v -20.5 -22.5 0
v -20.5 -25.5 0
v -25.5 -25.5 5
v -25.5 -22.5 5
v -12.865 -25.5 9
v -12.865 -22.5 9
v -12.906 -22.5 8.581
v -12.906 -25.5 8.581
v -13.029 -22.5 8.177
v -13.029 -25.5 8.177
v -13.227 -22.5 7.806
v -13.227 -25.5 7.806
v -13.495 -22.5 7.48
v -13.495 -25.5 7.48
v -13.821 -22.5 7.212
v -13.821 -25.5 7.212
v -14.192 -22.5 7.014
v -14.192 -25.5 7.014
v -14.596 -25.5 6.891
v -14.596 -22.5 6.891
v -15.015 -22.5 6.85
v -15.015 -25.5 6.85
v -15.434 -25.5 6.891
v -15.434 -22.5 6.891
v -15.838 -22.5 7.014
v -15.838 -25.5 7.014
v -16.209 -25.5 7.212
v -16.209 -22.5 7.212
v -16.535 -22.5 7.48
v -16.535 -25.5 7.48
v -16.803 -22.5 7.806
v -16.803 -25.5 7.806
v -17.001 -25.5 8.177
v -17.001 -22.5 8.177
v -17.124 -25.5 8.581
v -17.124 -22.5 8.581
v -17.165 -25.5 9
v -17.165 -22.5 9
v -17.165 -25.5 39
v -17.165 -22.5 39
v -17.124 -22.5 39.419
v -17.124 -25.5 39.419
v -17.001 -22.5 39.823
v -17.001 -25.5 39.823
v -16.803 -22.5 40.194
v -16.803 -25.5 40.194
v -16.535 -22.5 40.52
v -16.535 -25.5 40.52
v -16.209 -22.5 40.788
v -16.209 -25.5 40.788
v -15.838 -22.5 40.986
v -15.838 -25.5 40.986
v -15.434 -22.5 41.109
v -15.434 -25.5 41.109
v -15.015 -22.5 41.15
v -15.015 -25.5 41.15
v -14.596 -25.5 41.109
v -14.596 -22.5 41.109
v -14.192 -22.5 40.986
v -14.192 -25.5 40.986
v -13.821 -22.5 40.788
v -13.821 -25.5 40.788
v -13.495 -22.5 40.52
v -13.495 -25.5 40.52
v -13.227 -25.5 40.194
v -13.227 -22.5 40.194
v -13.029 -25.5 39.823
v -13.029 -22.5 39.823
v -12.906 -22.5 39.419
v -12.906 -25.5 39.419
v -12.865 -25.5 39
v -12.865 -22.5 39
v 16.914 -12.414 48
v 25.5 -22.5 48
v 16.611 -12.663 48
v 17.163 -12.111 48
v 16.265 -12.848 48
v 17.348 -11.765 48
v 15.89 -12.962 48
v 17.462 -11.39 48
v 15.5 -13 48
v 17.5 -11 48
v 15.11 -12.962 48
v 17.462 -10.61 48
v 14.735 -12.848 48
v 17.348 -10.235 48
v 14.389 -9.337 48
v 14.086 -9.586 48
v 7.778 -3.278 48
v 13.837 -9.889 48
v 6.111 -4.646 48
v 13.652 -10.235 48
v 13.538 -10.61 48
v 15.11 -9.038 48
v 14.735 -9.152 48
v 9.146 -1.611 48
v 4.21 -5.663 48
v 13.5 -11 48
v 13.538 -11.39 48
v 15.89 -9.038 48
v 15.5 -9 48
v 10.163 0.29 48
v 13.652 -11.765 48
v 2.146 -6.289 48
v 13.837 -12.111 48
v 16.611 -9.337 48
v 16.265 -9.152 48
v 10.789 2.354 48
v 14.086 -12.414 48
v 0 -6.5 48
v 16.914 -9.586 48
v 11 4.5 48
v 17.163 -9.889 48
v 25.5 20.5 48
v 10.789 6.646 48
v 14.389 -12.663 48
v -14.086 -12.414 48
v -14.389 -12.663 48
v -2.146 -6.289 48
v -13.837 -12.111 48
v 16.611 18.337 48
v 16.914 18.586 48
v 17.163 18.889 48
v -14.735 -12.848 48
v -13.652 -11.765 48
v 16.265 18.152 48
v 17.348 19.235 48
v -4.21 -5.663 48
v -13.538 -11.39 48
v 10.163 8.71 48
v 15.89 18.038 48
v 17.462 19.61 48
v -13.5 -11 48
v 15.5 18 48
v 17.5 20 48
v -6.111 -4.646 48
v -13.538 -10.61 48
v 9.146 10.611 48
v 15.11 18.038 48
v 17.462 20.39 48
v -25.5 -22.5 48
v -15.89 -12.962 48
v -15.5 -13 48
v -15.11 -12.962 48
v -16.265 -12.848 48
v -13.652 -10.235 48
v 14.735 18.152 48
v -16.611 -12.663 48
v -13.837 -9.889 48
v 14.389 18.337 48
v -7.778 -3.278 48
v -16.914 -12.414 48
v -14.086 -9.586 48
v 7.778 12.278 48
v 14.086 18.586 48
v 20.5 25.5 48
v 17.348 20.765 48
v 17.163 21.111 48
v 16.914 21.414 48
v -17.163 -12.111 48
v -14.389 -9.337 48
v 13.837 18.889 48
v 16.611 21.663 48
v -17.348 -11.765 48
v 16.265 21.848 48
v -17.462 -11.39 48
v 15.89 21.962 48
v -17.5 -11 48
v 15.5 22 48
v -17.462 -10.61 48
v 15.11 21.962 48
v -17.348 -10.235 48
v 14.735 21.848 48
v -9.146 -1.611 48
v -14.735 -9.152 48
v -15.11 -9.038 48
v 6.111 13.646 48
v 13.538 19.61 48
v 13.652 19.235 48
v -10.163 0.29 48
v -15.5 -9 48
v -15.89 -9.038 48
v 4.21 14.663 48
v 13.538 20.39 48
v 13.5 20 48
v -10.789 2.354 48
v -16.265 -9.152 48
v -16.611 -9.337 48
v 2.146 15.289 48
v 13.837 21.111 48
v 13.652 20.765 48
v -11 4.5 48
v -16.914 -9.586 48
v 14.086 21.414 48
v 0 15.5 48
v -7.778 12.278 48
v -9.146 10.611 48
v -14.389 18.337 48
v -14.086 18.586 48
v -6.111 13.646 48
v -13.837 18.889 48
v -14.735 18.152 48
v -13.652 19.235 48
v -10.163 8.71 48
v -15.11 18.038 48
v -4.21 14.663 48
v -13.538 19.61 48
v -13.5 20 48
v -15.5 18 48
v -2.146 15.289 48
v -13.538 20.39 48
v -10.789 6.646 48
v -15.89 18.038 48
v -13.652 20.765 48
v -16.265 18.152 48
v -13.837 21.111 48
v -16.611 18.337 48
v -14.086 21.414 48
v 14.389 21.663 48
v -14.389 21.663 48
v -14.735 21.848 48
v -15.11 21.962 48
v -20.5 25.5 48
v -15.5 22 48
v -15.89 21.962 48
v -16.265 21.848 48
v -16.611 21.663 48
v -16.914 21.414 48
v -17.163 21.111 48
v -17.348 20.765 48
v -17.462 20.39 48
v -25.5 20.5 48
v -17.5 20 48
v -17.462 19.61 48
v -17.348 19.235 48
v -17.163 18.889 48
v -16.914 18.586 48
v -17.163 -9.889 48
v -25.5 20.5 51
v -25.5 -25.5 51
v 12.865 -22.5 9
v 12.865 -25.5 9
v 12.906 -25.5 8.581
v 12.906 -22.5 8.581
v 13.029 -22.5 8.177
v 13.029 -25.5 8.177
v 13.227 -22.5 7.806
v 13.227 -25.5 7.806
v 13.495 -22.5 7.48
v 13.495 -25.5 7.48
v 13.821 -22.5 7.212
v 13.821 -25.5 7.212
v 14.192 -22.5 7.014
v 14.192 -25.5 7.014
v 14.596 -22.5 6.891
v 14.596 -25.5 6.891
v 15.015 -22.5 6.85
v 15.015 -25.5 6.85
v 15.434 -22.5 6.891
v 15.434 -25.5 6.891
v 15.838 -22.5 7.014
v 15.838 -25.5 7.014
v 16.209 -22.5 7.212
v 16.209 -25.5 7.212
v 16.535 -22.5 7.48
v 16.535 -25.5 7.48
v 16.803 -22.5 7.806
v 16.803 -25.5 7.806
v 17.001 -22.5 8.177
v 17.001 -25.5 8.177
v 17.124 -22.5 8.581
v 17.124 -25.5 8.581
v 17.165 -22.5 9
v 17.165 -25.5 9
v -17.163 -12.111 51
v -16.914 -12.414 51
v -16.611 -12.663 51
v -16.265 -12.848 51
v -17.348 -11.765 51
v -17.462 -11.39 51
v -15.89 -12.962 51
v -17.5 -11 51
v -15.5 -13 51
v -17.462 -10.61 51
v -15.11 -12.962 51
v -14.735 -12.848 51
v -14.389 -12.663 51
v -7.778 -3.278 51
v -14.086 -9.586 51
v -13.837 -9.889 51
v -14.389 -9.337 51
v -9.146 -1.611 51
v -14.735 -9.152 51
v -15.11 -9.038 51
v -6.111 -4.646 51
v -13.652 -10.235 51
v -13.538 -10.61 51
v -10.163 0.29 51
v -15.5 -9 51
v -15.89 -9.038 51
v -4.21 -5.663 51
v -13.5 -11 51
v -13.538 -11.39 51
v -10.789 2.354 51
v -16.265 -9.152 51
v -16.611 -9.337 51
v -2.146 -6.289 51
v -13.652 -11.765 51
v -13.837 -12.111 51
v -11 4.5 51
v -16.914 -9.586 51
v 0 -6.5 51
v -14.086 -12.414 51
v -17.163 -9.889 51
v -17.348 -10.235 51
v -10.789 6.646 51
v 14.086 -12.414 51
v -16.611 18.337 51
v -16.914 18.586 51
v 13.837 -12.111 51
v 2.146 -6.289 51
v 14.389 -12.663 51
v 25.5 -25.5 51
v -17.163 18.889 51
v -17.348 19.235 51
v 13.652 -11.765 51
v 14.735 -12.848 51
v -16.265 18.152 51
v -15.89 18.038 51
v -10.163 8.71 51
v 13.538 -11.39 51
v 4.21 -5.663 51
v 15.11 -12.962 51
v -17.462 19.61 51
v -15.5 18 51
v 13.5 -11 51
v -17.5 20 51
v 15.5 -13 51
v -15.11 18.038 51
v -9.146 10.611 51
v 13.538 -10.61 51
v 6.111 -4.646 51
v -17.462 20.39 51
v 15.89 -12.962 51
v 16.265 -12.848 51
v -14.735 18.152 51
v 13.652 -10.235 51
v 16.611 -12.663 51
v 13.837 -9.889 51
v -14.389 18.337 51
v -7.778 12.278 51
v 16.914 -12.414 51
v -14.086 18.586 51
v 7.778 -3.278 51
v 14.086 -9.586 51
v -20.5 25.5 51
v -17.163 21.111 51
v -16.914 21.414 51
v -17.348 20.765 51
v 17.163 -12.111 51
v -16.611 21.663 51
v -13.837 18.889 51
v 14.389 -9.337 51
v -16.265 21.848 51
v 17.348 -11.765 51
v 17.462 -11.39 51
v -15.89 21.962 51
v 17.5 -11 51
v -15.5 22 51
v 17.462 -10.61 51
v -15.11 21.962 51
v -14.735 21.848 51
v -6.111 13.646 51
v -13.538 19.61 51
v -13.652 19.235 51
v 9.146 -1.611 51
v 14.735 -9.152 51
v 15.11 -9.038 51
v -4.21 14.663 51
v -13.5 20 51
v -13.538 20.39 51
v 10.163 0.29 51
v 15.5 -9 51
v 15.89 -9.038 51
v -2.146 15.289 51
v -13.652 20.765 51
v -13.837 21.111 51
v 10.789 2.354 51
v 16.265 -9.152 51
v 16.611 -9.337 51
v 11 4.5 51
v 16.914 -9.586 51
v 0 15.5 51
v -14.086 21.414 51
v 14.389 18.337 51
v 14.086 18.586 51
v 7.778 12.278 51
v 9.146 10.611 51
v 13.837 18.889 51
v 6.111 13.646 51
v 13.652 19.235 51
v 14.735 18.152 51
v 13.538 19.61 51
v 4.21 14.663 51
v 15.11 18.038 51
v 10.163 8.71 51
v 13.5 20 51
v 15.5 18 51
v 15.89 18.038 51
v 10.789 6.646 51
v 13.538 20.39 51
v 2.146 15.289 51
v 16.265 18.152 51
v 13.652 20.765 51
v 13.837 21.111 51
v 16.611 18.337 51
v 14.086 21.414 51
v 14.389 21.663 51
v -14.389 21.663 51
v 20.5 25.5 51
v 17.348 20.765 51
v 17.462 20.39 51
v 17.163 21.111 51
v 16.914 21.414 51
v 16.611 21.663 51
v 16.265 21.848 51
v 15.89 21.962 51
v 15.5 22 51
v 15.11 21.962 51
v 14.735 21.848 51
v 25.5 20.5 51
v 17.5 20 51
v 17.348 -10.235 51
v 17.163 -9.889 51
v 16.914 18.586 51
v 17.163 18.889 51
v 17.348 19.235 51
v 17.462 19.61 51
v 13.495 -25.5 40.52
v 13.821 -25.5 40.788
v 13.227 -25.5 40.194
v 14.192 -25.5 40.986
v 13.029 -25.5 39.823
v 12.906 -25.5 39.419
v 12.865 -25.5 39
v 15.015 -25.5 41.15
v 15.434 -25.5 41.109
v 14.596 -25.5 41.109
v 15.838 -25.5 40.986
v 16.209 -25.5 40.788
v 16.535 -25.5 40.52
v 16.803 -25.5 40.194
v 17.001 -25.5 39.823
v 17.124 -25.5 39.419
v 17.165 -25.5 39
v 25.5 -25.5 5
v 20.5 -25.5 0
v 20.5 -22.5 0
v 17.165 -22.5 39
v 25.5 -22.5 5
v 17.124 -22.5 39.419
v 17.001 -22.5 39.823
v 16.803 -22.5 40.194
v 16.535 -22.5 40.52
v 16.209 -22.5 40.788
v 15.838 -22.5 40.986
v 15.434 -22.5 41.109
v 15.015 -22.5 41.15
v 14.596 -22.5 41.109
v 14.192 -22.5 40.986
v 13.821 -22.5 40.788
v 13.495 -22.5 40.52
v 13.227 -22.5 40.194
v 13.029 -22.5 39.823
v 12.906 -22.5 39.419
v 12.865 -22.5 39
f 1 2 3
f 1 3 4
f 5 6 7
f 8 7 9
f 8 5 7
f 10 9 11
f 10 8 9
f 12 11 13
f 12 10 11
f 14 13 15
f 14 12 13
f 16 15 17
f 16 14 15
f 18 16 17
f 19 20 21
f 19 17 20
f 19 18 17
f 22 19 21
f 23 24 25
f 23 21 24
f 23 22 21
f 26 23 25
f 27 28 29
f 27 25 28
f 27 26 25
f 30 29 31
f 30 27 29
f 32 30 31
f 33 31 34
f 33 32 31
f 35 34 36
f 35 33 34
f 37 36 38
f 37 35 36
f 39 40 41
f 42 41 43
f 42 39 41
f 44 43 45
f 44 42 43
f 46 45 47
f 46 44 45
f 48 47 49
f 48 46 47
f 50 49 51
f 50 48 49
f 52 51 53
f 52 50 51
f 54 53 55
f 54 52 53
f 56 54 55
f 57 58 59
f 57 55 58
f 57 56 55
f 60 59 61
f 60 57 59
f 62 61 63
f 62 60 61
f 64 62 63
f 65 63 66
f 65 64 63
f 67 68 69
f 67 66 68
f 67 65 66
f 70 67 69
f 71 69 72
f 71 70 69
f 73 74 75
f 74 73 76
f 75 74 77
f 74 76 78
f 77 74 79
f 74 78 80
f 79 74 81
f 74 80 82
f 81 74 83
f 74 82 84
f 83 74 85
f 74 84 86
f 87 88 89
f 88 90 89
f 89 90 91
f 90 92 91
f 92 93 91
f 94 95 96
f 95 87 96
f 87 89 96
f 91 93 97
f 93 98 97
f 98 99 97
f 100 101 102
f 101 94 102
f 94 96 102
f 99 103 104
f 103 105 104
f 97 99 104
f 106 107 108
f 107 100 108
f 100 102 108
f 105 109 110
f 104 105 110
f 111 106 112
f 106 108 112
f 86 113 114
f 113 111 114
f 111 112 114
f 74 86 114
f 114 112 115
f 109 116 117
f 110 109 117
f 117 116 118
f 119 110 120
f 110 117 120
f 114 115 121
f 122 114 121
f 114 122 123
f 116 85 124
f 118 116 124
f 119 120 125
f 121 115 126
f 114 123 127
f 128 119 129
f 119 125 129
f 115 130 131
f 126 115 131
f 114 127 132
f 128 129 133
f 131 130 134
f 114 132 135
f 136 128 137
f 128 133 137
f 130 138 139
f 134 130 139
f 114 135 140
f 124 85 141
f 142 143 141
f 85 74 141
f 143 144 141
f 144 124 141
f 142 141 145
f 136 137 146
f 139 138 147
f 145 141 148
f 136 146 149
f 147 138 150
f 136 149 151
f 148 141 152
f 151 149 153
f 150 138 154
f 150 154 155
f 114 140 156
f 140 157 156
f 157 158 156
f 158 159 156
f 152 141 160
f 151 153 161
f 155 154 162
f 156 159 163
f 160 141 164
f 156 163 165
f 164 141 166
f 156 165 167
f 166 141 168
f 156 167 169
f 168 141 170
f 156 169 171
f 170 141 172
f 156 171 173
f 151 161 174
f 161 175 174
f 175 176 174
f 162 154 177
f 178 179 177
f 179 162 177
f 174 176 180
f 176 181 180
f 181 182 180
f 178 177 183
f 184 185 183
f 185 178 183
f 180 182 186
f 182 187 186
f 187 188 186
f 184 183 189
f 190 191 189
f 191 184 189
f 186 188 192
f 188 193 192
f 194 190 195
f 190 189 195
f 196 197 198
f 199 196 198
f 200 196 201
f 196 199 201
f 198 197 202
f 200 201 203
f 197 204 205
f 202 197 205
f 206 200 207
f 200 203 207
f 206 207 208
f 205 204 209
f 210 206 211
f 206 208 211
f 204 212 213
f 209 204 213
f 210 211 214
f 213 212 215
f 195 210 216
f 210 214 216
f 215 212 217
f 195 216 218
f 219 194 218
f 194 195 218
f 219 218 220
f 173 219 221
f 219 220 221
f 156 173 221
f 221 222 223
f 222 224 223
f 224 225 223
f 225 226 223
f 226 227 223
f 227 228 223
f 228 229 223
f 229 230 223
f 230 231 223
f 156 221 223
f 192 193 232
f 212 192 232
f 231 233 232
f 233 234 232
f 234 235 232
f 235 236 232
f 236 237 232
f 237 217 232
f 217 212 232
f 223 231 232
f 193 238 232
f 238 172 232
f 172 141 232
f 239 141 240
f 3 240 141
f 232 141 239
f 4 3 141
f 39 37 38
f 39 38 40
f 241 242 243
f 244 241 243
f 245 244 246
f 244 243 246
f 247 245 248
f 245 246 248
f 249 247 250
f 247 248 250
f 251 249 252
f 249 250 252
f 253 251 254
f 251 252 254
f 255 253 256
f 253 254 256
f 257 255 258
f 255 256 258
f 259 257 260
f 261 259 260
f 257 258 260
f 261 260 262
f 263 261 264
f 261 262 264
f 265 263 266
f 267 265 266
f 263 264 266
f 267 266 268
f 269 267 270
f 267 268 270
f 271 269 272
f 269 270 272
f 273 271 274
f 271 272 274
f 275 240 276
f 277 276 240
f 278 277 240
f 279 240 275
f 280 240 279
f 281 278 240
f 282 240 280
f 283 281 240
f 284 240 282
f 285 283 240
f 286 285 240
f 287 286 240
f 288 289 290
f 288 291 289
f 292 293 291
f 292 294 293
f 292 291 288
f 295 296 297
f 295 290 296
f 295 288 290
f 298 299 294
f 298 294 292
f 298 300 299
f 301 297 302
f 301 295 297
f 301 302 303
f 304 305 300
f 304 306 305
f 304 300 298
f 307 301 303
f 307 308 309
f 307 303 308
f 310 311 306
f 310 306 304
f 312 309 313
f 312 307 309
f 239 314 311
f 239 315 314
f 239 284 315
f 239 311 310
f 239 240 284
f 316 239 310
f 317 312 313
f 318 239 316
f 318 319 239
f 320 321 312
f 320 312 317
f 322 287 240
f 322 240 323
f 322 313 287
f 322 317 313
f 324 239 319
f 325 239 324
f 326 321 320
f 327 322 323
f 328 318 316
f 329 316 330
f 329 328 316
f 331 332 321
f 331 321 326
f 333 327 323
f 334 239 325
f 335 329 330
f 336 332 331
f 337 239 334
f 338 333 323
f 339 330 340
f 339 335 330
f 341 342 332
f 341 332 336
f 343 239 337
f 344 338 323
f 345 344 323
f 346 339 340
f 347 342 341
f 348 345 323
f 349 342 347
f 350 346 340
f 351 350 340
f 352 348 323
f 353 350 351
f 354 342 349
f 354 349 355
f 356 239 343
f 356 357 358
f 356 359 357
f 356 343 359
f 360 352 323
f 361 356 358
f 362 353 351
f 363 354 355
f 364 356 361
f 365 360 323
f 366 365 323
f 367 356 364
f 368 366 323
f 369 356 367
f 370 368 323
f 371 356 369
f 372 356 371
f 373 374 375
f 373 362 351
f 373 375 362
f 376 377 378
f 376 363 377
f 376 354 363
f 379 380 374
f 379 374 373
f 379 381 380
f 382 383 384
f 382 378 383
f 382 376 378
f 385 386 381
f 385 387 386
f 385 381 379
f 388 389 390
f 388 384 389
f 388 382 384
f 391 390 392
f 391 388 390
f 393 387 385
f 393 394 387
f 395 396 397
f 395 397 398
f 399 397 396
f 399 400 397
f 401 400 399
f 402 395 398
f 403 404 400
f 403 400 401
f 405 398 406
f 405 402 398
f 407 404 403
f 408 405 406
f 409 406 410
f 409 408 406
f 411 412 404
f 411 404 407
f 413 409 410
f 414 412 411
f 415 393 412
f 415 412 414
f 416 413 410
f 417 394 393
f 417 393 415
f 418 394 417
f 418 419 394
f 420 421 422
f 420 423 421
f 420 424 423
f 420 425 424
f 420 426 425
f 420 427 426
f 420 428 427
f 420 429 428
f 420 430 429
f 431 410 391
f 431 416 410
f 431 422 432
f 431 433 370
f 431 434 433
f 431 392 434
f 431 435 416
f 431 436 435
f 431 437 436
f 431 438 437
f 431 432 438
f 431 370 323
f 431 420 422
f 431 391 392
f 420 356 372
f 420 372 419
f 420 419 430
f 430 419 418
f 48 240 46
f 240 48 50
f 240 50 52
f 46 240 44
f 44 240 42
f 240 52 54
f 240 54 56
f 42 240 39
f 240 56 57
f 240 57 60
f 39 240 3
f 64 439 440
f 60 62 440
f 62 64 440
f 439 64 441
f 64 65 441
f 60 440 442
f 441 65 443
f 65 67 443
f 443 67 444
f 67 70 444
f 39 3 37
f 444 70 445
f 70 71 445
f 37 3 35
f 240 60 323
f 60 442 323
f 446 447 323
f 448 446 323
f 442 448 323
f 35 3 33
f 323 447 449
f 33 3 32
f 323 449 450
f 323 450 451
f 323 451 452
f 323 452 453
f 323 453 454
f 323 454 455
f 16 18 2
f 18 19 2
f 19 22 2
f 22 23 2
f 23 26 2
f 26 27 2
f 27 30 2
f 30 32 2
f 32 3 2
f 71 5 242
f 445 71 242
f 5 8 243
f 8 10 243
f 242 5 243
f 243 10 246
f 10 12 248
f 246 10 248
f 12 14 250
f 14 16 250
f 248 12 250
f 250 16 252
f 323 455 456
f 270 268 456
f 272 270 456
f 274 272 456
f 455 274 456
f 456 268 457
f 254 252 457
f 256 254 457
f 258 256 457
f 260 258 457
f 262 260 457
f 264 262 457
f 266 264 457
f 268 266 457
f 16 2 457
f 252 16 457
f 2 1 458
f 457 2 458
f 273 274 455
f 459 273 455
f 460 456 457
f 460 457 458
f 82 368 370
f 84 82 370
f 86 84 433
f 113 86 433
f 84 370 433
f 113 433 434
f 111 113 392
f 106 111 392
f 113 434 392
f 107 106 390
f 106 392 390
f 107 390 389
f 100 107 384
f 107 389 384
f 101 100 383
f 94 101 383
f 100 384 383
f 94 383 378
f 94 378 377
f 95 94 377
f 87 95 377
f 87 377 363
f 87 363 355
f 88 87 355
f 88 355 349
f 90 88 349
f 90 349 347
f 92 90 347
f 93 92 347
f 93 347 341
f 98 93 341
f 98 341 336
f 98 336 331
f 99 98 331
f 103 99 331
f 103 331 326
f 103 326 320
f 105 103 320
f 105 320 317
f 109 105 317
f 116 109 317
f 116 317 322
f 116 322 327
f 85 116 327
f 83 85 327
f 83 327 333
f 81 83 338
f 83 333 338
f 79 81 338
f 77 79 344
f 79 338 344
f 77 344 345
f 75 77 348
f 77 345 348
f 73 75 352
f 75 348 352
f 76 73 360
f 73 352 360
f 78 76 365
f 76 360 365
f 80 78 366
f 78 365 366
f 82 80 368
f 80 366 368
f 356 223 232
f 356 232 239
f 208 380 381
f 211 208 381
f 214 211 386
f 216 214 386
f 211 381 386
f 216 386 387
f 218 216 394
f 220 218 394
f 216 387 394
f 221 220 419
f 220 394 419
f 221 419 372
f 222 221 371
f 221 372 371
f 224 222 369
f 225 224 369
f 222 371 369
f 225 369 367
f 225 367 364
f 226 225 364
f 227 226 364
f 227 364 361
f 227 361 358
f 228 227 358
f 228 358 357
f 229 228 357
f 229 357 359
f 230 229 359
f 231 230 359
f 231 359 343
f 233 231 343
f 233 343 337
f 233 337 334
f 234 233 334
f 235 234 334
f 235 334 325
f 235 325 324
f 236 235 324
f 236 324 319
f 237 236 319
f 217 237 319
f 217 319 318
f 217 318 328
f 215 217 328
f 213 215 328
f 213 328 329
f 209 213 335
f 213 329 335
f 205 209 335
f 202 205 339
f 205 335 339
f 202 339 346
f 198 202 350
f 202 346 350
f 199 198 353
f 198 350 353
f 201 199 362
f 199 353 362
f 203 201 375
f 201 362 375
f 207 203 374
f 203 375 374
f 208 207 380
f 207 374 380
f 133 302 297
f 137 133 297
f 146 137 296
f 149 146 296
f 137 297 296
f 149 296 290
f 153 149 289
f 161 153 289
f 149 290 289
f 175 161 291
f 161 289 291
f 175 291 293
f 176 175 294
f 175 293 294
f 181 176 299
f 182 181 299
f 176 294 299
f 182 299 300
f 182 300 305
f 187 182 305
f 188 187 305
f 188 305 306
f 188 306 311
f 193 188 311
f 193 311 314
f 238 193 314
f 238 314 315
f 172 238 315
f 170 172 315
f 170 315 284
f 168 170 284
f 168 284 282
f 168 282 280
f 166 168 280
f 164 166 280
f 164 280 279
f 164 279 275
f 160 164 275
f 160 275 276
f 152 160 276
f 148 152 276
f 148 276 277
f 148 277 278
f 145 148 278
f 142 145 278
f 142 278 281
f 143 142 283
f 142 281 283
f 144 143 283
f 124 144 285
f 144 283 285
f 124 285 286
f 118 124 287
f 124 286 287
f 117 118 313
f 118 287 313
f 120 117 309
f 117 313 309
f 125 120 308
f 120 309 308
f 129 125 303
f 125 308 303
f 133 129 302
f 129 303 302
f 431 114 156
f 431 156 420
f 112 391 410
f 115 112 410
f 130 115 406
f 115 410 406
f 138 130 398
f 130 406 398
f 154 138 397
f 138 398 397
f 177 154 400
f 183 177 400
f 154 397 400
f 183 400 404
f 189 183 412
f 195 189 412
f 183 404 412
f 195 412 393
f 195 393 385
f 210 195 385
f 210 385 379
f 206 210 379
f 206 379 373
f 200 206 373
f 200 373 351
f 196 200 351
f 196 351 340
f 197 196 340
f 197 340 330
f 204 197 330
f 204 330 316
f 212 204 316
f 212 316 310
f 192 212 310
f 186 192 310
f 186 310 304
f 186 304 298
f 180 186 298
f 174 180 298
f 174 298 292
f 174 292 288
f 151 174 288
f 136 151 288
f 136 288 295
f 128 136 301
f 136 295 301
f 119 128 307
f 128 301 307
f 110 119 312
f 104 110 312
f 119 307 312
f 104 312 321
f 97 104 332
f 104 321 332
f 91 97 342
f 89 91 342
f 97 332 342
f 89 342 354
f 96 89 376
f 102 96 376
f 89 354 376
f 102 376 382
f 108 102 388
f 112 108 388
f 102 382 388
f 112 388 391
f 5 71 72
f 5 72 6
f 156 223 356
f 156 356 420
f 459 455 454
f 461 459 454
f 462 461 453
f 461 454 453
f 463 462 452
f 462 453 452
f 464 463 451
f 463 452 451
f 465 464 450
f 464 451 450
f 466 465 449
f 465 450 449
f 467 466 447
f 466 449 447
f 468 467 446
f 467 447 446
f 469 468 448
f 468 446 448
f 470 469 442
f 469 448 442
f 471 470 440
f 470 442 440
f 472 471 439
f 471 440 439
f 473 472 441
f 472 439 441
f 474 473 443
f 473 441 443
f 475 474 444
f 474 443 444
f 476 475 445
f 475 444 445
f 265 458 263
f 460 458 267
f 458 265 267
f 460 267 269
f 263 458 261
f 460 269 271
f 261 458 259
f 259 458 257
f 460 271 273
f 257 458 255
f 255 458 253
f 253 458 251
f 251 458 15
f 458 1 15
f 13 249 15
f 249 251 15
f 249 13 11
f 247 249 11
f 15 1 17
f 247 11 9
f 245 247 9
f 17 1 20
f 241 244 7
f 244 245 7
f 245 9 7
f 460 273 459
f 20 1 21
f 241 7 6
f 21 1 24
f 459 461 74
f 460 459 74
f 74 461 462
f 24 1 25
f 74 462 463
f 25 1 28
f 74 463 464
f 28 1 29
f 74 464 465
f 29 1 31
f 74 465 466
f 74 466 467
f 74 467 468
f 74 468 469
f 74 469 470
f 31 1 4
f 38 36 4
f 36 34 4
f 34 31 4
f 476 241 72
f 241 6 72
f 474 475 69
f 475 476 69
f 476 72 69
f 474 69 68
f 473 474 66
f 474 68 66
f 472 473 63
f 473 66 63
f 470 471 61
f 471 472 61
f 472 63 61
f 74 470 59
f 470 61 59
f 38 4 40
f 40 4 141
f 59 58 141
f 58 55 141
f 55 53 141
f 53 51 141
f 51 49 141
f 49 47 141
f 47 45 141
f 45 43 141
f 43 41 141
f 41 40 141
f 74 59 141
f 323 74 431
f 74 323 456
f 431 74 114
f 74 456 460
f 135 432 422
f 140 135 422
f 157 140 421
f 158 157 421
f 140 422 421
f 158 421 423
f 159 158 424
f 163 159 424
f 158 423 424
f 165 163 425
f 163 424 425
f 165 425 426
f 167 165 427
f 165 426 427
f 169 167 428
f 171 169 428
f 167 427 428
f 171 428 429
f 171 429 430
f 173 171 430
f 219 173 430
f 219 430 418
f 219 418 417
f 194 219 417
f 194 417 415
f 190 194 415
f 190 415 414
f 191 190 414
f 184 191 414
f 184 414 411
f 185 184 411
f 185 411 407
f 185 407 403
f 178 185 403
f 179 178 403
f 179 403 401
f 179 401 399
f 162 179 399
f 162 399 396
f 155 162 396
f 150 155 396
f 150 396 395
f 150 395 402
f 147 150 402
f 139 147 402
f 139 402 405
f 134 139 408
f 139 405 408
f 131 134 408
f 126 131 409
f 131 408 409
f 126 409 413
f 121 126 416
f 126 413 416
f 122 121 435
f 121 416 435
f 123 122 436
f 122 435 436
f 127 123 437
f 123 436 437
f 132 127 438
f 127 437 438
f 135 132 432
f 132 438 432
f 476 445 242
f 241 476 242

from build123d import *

# Parameters (mm, degrees)
IZIM1_W                     = 51
IZIM1_H                     = 51
Y_KSEKLIK_EKSTR_ZYON1_DEPTH = 51
IZIM2_W                     = 54.245036078
IZIM2_H                     = 53.426157313
KES_EKSTR_ZYON1_DEPTH       = 51
IZIM3_R                     = 11
IZIM3_R_2                   = 2
KES_EKSTR_ZYON2_DEPTH       = 51
PAH1_SIZE                   = 5
PAH2_SIZE                   = 5
KES_EKSTR_ZYON3_DEPTH       = 51


with BuildPart() as part:
    # Çizim1 → Yükseklik-Ekstrüzyon1 (new body)
    with BuildSketch(Plane.XY):
        Rectangle(IZIM1_W, IZIM1_H)
    extrude(amount=Y_KSEKLIK_EKSTR_ZYON1_DEPTH)

    # Çizim2 → Kes-Ekstrüzyon1 (cut)
    with BuildSketch(Plane.ZY.offset(25.5)):
        with Locations((20.877481961, 4.213078657)):
            Rectangle(IZIM2_W, IZIM2_H)
    extrude(amount=-KES_EKSTR_ZYON1_DEPTH, mode=Mode.SUBTRACT)

    # Çizim3 → Kes-Ekstrüzyon2 (cut)
    with BuildSketch(Plane.XY.offset(51)):
        with Locations((0, 4.5)):
            Circle(IZIM3_R)
        with Locations((-15.5, 20)):
            Circle(IZIM3_R_2)
        with Locations((15.5, 20)):
            Circle(IZIM3_R_2)
        with Locations((-15.5, -11)):
            Circle(IZIM3_R_2)
        with Locations((15.5, -11)):
            Circle(IZIM3_R_2)
    extrude(amount=-KES_EKSTR_ZYON2_DEPTH, mode=Mode.SUBTRACT)

    # Pah1
    pah1_edges = [part.edges().sort_by_distance(p)[0] for p in [
        (-25.5, 25.5, 49.5),
    ]]
    chamfer(pah1_edges, length=PAH1_SIZE)

    # Pah2
    pah2_edges = [part.edges().sort_by_distance(p)[0] for p in [
        (-25.5, -24, 0),
        (25.5, -24, 0),
        (25.5, 25.5, 49.5),
    ]]
    chamfer(pah2_edges, length=PAH2_SIZE)

    # Çizim4 → Kes-Ekstrüzyon3 (cut)
    with BuildSketch(Plane.XZ.offset(25.5)):
        with BuildLine():
            Line((-12.865, 39), (-12.865, 9))
            ThreePointArc((-12.865, 9), (-15.015, 6.85), (-17.165, 9))
            Line((-17.165, 9), (-17.165, 39))
            ThreePointArc((-17.165, 39), (-15.015, 41.15), (-12.865, 39))
        make_face()
        with BuildLine():
            Line((12.865, 39), (12.865, 9))
            ThreePointArc((12.865, 9), (15.015, 6.85), (17.165, 9))
            Line((17.165, 9), (17.165, 39))
            ThreePointArc((17.165, 39), (15.015, 41.15), (12.865, 39))
        make_face()
    extrude(amount=-KES_EKSTR_ZYON3_DEPTH, mode=Mode.SUBTRACT)


solid = part.part
